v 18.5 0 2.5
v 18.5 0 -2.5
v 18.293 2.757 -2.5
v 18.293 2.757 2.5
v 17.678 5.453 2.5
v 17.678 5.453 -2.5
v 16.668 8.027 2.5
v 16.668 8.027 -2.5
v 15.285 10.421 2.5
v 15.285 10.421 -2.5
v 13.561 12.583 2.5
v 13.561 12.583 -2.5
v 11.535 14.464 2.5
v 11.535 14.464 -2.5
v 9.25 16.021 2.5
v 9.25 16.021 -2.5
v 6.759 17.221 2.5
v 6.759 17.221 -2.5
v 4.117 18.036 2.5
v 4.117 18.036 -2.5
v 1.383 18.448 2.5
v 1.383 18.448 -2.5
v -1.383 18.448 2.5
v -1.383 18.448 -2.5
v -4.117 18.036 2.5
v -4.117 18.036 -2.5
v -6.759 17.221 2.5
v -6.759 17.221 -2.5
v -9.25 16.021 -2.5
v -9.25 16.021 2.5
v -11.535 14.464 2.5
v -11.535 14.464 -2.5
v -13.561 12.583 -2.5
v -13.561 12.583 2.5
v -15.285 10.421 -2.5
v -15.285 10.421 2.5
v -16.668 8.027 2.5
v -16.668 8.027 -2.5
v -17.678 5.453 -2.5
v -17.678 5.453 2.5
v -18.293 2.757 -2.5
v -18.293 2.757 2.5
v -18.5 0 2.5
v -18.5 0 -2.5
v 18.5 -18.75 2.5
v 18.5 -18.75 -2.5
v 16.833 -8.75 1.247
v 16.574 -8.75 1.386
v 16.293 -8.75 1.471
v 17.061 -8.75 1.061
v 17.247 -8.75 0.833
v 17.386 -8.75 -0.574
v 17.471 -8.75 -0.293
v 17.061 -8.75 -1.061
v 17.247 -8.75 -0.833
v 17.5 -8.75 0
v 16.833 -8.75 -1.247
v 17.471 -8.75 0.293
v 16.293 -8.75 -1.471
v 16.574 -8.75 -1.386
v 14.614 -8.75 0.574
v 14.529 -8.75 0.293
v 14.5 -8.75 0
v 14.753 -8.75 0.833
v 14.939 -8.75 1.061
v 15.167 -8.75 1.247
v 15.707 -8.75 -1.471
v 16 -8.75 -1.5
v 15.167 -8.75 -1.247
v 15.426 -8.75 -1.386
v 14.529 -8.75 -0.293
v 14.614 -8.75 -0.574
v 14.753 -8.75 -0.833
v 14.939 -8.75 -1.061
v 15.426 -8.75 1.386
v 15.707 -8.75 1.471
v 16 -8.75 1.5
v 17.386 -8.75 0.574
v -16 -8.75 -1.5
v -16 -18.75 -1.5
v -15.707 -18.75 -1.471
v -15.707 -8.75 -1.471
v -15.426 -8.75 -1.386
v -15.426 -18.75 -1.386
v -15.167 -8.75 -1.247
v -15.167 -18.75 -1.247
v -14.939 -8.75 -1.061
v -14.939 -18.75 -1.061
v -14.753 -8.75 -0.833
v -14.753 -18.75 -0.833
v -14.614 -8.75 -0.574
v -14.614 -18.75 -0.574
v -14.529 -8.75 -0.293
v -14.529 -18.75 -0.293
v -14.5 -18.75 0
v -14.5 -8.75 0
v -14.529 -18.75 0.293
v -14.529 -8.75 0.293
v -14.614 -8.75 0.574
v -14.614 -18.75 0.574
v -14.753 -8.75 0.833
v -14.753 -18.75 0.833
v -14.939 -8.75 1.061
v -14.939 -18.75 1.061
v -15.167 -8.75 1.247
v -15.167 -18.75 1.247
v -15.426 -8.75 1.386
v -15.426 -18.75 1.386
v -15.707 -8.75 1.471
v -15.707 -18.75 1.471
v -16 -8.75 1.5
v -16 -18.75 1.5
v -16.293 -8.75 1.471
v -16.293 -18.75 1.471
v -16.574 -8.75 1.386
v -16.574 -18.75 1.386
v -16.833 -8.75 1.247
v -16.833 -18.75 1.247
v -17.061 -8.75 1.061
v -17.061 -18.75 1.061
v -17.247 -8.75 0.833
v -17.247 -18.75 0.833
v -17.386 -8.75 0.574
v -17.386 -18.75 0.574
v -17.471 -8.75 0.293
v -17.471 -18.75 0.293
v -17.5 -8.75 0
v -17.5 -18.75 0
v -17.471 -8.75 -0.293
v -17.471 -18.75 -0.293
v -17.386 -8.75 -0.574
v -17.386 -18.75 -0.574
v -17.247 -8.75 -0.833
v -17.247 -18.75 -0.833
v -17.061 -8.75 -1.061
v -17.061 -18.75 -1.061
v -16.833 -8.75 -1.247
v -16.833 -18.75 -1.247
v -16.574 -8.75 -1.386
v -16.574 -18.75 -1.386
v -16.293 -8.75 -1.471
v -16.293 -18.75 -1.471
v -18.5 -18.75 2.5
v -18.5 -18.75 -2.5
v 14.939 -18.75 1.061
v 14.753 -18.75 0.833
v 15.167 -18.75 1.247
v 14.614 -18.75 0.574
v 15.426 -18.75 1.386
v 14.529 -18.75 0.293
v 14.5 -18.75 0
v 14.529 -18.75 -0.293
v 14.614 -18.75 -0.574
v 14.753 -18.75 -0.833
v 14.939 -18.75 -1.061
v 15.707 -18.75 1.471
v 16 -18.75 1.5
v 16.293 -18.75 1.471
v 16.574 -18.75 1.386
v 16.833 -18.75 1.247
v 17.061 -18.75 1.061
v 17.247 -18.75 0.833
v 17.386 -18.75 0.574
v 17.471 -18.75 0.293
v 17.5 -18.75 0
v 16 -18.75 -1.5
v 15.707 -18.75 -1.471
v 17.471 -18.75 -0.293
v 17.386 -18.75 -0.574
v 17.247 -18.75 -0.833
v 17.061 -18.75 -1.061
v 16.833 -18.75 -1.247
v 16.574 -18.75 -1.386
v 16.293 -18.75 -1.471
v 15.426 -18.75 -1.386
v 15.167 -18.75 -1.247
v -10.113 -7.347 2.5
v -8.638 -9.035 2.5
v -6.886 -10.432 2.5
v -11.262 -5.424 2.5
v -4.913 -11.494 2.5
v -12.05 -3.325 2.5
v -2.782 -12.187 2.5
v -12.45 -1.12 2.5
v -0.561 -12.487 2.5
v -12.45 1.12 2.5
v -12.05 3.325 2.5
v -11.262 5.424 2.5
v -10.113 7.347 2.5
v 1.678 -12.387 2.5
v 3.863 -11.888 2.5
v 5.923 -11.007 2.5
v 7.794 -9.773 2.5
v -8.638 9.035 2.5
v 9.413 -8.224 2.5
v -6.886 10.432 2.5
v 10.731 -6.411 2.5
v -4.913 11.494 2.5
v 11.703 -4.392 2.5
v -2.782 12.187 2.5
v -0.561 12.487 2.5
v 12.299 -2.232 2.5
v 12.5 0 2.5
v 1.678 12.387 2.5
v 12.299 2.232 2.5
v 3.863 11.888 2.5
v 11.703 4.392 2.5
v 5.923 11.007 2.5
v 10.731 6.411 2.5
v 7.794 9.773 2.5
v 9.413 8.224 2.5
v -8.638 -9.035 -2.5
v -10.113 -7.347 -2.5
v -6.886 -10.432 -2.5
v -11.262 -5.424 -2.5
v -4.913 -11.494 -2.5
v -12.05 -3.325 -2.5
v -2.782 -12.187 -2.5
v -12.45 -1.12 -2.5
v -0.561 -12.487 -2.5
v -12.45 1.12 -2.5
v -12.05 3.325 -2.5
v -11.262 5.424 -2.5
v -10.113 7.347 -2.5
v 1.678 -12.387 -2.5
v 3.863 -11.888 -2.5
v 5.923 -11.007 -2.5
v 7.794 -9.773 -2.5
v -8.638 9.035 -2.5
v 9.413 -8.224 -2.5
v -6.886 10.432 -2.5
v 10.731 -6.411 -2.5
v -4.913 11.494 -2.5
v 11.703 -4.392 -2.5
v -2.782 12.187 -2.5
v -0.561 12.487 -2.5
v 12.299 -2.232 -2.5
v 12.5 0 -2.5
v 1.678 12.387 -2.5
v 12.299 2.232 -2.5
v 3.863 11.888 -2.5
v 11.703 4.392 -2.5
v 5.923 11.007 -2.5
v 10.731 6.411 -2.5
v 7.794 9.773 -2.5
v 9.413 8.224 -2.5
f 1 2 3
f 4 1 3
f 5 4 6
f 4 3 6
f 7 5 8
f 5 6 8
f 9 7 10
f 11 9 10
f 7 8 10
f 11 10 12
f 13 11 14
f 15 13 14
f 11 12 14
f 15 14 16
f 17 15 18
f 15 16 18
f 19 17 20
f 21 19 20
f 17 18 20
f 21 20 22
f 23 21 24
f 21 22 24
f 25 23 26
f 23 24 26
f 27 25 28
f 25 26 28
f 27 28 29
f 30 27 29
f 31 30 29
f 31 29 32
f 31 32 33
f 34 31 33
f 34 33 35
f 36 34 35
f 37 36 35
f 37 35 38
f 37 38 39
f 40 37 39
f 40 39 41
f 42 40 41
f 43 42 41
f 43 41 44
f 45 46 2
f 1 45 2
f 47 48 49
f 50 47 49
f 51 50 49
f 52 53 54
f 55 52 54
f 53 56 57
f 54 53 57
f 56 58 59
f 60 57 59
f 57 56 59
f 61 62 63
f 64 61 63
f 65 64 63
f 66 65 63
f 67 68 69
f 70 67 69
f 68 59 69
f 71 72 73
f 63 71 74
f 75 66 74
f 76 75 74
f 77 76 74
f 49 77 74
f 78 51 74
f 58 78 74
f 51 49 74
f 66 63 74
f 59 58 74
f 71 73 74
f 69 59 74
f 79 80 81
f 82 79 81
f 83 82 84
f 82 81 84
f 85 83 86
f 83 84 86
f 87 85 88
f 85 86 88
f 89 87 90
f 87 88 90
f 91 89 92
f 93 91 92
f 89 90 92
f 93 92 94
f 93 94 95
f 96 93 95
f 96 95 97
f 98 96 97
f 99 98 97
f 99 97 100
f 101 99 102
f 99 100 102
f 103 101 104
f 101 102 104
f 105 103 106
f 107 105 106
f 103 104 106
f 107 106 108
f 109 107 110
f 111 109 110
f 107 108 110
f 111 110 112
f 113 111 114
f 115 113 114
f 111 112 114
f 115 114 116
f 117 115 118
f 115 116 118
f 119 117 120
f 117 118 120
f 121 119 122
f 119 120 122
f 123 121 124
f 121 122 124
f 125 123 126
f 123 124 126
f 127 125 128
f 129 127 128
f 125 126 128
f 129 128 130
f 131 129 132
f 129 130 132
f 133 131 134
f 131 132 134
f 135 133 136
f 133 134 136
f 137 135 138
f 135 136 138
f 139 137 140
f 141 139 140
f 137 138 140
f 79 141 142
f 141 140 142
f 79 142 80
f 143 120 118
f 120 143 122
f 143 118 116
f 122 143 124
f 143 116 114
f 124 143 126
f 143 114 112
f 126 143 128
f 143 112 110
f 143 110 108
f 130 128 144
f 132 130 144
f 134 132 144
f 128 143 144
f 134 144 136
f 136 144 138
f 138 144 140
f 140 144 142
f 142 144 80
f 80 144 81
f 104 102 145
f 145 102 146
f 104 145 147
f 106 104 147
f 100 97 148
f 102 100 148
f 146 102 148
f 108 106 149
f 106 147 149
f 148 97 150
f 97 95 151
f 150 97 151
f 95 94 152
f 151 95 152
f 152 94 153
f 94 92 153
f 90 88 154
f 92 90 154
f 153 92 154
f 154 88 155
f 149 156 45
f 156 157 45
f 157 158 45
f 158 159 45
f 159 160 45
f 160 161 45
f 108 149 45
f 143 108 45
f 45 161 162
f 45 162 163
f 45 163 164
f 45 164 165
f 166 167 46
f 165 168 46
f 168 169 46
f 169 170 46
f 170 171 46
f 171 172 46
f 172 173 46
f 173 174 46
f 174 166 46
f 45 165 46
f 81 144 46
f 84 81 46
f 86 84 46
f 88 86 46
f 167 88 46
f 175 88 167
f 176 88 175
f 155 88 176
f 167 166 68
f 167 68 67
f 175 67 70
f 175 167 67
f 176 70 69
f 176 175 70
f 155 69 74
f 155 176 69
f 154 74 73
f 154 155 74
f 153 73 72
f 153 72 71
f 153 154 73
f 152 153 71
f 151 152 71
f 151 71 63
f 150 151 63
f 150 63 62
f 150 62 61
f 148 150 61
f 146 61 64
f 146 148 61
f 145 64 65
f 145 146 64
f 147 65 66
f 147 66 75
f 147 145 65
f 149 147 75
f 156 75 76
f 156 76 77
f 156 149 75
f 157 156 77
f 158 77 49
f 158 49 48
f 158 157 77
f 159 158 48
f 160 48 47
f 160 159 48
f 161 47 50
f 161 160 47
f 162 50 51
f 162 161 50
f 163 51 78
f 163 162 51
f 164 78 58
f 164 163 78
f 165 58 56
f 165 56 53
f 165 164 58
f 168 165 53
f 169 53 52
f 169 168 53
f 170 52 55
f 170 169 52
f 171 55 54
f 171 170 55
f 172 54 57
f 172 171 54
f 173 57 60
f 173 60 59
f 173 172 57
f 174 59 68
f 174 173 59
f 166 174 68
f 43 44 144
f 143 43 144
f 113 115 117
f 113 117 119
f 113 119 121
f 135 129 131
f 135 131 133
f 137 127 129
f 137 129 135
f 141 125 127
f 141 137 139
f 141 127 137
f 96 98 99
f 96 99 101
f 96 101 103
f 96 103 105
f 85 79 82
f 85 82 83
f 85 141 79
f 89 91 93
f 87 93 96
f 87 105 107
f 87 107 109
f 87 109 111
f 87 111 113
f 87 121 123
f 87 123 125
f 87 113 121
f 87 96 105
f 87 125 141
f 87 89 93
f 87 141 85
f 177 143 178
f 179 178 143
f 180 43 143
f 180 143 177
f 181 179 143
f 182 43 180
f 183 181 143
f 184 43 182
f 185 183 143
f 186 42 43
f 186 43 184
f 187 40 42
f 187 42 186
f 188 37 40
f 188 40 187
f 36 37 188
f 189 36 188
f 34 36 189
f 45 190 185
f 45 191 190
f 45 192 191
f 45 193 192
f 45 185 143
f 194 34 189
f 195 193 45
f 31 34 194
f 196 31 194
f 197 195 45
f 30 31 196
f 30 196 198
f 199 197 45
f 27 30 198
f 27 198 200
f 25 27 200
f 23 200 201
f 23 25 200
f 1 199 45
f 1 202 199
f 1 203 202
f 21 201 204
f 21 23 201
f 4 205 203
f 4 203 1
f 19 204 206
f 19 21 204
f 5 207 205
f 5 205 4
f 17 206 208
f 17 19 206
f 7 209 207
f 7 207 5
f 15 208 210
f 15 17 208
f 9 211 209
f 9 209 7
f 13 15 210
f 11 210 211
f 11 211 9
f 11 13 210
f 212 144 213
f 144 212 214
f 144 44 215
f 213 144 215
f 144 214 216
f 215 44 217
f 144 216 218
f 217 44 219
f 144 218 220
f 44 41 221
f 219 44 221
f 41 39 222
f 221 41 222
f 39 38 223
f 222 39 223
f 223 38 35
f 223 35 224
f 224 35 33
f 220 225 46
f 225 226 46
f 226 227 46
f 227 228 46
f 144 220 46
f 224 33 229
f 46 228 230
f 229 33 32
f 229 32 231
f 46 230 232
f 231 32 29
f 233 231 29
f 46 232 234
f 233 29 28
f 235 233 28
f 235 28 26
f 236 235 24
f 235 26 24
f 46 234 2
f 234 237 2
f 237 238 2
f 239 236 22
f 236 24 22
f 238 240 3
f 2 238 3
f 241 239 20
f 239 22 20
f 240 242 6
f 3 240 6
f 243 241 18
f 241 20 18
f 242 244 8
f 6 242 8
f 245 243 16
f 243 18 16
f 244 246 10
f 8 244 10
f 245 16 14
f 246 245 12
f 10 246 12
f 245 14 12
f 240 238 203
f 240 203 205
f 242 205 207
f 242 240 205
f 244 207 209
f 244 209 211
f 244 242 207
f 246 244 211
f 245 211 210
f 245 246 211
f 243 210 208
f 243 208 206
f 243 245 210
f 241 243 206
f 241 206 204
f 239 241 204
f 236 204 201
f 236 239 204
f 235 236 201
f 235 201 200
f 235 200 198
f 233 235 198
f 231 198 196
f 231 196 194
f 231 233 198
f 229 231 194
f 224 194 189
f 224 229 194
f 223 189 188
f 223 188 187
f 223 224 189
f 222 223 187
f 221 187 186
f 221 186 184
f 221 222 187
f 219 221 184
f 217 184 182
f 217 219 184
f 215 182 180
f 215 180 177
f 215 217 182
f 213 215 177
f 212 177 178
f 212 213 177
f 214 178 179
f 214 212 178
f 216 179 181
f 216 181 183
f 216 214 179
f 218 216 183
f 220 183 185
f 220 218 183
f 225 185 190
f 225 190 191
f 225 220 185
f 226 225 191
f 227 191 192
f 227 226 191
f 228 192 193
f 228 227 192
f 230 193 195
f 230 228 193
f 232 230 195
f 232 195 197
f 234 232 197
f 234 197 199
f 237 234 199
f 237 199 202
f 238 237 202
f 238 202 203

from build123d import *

# Parameters (mm, degrees)
BOSS_EXTRUDE1_DEPTH      = 2.5
BOSS_EXTRUDE1_DEPTH_BACK = 2.5
SKETCH1_R                = 12.5
SKETCH2_R                = 1.5
CUT_EXTRUDE1_DEPTH       = 10


with BuildPart() as part:
    # Sketch1 → Boss-Extrude1 (new, two sides: drawn at the far end of the back side and taken through both)
    with BuildSketch(Plane.XY.offset(-BOSS_EXTRUDE1_DEPTH_BACK)):
        with BuildLine():
            Line((18.5, -18.75), (18.5, 0))
            ThreePointArc((18.5, 0), (0, 18.5), (-18.5, 0))
            Line((-18.5, 0), (-18.5, -18.75))
            Line((-18.5, -18.75), (18.5, -18.75))
        make_face()
        Circle(SKETCH1_R, mode=Mode.SUBTRACT)
    extrude(amount=BOSS_EXTRUDE1_DEPTH + BOSS_EXTRUDE1_DEPTH_BACK)

    # Sketch2 → Cut-Extrude1 (cut)
    with BuildSketch(Plane.XZ.offset(18.75)):
        with Locations((-16, 0)):
            Circle(SKETCH2_R)
    cut_extrude1 = extrude(amount=-CUT_EXTRUDE1_DEPTH, mode=Mode.SUBTRACT)

    # Mirror1: Cut-Extrude1 across plane
    add(cut_extrude1.mirror(Plane(origin=(0, 0, 0), x_dir=(0, 0, 1), z_dir=(1, 0, 0))), mode=Mode.SUBTRACT)


solid = part.part
